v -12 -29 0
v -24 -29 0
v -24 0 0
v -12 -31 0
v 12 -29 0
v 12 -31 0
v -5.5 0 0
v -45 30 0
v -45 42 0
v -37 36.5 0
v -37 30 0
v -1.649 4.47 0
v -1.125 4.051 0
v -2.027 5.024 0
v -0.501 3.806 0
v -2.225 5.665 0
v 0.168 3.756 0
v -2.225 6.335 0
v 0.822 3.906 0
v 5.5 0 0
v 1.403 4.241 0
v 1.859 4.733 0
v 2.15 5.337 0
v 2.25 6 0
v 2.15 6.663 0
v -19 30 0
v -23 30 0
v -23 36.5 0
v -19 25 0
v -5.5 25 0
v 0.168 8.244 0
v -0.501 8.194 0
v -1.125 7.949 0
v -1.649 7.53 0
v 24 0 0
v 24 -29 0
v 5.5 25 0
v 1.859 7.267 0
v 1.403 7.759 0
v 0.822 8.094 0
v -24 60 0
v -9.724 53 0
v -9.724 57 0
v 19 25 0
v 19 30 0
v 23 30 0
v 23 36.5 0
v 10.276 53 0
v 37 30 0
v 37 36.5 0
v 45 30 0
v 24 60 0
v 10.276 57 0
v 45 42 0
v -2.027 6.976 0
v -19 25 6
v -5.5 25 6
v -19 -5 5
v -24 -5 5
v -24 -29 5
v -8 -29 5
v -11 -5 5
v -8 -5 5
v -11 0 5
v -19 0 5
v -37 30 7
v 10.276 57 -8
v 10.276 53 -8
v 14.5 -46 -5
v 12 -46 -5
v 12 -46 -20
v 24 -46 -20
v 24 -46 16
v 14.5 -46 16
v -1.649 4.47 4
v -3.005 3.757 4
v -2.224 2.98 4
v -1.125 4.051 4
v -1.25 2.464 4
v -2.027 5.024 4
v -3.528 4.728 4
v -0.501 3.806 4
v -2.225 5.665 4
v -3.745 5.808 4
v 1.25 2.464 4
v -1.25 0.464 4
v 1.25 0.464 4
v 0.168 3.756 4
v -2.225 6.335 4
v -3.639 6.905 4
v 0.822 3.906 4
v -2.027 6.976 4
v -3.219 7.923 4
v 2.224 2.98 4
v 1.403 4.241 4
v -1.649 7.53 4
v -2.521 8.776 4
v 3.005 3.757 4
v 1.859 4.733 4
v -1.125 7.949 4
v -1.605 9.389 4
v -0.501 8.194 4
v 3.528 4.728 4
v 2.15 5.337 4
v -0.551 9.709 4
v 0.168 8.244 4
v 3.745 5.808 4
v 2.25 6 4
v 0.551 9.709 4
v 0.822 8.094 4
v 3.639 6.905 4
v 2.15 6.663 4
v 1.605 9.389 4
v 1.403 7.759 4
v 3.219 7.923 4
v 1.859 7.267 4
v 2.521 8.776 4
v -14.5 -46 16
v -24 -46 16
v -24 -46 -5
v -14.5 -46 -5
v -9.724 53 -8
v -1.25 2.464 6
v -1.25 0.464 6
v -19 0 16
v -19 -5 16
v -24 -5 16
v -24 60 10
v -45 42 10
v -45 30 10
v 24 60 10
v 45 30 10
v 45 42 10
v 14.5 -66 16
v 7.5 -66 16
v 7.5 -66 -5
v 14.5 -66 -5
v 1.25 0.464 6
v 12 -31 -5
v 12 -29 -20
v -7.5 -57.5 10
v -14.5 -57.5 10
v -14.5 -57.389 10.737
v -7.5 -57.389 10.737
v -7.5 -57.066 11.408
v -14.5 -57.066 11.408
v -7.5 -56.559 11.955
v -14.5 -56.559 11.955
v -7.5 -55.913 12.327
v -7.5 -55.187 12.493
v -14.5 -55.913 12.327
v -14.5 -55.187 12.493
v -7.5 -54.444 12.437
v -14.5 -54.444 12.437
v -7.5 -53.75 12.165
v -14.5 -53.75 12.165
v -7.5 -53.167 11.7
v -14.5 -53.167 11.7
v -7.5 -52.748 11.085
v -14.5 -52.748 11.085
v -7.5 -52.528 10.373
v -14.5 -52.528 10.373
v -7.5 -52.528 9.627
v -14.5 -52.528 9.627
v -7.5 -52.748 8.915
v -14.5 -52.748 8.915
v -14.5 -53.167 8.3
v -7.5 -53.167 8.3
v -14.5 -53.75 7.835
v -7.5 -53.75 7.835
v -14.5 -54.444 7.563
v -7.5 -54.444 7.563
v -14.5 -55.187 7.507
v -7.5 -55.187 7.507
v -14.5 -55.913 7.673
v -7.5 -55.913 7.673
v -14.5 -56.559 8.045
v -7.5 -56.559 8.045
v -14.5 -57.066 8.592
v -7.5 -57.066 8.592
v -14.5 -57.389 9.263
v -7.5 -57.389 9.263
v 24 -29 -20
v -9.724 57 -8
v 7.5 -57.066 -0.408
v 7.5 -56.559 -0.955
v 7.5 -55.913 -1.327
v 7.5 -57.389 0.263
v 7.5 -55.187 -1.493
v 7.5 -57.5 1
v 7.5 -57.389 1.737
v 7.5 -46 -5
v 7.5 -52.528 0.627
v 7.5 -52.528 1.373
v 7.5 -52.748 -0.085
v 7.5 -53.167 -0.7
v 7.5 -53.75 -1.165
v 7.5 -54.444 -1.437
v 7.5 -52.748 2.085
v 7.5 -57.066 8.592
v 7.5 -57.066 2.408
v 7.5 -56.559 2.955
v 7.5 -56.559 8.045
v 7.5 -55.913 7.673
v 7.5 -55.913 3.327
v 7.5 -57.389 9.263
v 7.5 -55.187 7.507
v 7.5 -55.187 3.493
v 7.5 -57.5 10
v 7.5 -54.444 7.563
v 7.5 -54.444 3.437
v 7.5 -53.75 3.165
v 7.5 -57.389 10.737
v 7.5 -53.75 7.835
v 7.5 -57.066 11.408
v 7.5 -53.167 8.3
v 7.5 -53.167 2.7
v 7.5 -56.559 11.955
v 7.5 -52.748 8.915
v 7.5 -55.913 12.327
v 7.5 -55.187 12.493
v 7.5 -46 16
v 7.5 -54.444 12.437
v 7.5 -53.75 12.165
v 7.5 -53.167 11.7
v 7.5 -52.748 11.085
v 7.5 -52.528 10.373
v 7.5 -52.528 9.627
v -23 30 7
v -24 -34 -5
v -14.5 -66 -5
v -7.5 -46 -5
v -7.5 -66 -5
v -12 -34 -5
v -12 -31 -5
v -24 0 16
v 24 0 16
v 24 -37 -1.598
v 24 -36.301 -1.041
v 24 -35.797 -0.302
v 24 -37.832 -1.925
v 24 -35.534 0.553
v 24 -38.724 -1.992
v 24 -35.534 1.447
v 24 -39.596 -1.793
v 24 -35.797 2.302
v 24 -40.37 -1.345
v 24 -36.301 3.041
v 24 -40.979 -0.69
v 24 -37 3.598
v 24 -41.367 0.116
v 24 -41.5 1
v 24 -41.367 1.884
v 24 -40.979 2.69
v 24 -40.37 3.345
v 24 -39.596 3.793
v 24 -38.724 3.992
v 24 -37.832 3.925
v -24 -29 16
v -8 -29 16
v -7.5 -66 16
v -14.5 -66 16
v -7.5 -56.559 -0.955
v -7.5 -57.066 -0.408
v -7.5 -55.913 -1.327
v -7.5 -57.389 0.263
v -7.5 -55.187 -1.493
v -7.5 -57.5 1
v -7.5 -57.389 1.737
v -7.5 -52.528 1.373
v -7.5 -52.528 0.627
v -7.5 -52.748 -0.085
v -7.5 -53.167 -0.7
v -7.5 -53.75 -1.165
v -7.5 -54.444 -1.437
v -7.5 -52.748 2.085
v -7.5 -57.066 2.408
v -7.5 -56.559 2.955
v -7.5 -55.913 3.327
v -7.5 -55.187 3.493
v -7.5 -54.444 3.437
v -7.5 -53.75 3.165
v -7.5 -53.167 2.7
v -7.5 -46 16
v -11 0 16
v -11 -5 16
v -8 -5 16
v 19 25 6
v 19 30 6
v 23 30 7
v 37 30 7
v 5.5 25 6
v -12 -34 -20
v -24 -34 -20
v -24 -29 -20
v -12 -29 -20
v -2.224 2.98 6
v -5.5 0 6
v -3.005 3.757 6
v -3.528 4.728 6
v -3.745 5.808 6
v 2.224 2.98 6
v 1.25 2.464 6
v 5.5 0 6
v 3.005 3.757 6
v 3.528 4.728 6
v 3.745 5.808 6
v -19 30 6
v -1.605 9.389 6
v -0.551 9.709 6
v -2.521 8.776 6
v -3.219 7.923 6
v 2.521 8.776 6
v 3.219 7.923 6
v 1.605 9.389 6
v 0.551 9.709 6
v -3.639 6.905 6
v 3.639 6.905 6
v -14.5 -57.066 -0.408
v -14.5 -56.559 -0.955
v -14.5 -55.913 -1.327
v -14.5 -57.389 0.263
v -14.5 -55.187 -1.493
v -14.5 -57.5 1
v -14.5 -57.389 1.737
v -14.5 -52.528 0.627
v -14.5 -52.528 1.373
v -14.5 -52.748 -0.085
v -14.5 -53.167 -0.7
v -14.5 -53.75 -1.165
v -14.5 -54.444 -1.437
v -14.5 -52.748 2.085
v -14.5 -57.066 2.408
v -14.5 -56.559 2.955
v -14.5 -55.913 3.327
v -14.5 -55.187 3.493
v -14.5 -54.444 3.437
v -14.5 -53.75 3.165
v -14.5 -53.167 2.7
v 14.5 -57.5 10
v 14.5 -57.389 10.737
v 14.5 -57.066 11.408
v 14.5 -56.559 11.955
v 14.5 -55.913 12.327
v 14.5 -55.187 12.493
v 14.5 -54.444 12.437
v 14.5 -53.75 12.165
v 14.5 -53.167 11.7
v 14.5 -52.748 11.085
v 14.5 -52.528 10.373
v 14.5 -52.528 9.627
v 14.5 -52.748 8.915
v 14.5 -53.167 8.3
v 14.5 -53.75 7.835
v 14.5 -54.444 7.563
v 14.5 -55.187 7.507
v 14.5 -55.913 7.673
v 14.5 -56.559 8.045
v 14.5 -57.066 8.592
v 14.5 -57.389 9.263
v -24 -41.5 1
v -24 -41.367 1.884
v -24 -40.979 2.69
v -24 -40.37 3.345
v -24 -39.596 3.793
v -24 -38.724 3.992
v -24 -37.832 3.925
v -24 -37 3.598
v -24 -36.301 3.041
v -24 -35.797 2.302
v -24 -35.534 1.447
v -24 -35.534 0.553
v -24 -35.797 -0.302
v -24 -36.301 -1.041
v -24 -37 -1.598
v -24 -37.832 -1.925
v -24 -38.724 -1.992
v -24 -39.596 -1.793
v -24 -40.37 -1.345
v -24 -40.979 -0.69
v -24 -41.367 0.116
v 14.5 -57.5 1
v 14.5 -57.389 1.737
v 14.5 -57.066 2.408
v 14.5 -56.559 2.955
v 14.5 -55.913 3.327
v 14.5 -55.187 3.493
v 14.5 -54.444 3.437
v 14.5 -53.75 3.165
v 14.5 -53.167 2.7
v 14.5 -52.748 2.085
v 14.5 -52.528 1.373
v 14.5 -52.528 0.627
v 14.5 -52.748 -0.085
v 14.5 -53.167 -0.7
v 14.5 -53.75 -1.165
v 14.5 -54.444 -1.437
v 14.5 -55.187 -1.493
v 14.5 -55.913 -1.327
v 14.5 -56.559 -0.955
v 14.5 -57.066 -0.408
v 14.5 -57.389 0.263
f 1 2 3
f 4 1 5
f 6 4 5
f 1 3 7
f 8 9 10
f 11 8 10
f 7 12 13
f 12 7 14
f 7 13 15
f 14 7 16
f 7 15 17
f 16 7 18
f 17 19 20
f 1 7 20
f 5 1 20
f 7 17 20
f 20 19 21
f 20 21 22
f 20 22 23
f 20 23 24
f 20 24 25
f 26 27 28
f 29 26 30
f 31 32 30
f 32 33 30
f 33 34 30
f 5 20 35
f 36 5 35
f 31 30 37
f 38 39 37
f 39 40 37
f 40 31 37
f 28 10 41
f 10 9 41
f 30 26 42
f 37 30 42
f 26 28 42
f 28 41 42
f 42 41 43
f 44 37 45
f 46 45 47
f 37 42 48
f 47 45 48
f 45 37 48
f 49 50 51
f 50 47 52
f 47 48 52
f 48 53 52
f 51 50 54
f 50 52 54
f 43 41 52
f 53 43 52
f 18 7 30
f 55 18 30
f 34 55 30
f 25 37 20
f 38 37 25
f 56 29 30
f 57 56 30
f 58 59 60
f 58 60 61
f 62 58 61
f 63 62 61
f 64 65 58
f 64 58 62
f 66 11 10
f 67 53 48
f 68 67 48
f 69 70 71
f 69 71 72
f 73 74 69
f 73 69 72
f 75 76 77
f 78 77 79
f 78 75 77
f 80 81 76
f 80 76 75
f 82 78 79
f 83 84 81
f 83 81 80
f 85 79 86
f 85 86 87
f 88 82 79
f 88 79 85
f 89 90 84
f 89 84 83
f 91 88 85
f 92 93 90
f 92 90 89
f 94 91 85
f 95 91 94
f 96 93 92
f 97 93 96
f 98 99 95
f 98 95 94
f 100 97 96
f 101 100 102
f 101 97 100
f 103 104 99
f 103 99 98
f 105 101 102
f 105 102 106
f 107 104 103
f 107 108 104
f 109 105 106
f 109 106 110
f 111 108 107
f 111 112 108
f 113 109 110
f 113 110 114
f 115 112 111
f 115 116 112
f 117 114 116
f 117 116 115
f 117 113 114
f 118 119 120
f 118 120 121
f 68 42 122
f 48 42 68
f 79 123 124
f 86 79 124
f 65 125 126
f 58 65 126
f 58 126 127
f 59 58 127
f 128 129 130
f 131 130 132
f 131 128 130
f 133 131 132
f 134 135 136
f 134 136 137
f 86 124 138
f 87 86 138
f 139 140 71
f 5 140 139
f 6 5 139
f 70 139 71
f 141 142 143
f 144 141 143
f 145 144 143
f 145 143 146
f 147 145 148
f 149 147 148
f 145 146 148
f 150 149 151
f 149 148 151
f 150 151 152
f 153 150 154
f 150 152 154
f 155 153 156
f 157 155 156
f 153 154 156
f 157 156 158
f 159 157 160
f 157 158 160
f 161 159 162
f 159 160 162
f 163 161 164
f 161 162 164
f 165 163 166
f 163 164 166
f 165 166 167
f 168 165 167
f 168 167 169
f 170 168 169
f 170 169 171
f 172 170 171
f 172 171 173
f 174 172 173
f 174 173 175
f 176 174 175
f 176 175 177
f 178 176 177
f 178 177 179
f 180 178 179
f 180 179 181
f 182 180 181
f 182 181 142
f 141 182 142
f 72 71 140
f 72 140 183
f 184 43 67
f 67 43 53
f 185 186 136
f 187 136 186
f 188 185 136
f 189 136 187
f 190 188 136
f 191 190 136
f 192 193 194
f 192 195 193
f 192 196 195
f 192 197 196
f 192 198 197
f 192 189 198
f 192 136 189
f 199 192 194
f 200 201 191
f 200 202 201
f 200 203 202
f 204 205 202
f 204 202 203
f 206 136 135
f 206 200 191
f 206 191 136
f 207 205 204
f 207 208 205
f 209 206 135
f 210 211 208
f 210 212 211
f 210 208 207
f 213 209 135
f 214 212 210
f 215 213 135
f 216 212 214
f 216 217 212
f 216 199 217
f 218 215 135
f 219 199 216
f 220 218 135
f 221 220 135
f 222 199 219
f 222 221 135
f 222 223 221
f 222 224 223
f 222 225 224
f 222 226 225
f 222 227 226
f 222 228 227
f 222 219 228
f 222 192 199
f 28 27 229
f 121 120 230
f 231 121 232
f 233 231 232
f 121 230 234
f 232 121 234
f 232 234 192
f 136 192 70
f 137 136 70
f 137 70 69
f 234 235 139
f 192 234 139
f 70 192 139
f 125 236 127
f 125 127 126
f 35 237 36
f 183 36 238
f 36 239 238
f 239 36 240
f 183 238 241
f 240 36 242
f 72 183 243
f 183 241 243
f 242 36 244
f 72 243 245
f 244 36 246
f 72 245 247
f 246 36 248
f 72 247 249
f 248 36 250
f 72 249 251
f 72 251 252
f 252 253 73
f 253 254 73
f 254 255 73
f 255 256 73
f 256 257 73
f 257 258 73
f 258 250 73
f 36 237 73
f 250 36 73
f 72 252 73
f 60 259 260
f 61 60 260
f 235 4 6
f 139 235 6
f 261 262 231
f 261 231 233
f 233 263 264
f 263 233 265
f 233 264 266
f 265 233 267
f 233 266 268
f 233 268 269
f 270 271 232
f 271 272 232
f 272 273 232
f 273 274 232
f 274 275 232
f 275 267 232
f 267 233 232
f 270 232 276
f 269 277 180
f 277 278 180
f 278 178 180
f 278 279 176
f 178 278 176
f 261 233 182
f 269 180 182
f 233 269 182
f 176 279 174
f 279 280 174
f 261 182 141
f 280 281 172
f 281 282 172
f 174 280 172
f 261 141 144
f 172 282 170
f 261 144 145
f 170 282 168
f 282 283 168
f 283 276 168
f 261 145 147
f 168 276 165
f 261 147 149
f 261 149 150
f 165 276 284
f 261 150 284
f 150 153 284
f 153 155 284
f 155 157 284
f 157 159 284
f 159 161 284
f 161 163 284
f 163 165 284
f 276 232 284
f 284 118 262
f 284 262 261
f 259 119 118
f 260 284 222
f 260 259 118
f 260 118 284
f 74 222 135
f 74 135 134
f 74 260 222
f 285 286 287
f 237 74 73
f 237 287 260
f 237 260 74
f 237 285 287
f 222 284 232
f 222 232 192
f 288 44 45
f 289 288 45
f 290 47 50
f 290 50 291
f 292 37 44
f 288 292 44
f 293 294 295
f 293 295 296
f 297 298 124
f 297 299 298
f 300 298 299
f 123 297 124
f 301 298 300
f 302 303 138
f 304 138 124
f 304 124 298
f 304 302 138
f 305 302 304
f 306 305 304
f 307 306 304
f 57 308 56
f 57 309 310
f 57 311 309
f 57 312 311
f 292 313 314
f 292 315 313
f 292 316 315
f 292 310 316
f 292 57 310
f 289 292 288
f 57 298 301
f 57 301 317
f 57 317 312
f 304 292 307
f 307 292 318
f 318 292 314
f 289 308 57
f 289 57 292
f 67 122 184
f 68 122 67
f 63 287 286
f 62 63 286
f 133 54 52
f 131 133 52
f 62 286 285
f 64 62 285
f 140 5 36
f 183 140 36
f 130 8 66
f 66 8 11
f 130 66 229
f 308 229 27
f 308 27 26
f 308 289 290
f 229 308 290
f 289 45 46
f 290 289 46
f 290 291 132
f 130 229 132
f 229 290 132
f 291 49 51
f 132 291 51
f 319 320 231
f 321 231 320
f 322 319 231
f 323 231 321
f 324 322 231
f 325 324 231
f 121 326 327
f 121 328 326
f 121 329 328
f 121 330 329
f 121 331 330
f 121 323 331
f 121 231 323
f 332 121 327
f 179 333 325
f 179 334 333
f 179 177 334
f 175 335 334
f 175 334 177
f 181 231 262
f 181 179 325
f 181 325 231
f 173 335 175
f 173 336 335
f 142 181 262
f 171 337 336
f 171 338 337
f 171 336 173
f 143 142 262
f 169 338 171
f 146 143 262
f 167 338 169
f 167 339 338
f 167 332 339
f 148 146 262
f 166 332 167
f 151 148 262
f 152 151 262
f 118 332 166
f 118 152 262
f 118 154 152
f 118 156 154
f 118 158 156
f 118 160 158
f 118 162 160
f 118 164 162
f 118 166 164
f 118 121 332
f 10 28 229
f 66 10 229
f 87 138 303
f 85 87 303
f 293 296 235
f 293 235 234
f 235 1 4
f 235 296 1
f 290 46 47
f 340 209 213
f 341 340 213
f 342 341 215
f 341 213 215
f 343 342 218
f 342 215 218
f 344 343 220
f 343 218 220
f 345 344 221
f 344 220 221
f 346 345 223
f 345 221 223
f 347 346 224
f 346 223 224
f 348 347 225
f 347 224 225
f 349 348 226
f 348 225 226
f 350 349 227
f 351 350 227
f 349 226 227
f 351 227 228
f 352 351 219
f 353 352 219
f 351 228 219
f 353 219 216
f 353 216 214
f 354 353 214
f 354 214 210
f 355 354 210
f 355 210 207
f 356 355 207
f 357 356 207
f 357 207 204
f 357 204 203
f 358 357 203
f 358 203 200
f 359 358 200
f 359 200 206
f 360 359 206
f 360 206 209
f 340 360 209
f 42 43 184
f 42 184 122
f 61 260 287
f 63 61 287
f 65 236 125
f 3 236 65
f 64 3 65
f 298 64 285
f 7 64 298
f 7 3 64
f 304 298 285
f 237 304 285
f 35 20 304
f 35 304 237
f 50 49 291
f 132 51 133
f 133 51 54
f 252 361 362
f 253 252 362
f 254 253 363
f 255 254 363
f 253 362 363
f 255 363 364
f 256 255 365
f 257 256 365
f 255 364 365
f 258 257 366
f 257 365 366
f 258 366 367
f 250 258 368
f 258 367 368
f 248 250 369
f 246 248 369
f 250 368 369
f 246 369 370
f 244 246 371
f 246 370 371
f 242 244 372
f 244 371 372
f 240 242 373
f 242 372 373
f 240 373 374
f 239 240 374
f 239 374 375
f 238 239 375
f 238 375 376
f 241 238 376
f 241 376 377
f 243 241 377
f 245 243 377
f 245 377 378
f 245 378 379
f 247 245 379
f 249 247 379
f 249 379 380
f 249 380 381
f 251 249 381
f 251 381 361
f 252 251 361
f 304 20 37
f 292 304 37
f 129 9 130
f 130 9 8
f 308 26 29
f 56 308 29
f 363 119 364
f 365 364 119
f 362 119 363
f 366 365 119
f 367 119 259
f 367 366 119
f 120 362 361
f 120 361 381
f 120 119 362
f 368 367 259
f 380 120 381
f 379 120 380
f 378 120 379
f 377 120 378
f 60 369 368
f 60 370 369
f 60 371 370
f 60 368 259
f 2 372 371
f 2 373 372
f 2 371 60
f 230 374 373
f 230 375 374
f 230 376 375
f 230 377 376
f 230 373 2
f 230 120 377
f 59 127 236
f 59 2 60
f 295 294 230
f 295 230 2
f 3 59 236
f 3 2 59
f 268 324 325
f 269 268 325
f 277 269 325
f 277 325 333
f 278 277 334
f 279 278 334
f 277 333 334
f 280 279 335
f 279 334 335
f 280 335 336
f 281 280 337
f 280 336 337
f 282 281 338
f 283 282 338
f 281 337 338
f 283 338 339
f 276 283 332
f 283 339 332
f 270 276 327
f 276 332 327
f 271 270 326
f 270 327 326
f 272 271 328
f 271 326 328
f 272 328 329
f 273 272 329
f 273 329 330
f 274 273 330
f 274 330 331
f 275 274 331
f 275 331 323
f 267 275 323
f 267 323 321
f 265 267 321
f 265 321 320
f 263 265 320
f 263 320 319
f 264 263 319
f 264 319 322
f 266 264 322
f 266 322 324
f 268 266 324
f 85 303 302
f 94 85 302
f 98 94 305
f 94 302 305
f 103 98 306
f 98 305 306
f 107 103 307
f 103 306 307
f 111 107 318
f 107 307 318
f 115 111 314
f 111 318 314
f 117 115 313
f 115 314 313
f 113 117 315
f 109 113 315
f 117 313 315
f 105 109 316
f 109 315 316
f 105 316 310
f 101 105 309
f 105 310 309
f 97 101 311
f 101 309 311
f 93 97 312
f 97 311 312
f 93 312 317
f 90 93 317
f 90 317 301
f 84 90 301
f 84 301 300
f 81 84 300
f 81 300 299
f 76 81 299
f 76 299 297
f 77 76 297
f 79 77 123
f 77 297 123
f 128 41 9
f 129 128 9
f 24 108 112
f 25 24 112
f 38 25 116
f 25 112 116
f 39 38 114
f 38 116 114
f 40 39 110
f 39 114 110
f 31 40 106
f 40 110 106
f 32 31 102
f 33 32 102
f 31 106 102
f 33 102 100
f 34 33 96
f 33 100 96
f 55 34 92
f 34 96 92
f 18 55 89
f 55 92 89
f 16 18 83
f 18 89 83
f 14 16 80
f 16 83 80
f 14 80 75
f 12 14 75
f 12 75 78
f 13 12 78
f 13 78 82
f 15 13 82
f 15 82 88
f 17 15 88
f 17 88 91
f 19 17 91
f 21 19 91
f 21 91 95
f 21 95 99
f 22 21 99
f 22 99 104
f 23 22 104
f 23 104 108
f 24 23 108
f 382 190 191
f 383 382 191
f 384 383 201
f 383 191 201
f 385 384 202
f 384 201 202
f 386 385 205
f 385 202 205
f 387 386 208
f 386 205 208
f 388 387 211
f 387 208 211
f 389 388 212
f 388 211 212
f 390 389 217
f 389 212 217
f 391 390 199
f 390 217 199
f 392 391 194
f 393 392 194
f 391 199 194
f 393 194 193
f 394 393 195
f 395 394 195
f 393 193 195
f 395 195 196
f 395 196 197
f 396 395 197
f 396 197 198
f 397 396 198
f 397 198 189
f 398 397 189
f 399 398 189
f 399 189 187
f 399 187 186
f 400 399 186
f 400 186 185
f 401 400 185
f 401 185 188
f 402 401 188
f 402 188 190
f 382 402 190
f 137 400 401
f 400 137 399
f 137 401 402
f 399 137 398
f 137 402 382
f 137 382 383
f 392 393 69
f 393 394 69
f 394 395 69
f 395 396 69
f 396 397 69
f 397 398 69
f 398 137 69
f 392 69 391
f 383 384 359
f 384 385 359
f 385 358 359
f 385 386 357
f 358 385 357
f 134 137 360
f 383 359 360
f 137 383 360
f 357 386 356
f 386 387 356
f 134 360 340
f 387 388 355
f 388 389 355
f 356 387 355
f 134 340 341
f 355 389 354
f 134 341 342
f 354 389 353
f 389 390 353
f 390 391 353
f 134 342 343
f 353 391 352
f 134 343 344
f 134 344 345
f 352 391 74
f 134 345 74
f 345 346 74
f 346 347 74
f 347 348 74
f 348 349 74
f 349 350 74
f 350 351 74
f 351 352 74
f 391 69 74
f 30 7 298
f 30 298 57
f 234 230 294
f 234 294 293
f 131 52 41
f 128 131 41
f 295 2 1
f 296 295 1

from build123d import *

# Parameters (mm, degrees)
F0_W      = 48
F0_H      = 46
F1_DEPTH  = 16
F2_W      = 11
F2_H      = 25
F3_DEPTH  = 6
F5_DEPTH  = 10
F6_W      = 12
F6_H      = 5
F6_H_2    = 17
F7_DEPTH  = 20
F8_W      = 48
F8_H      = 15
F9_DEPTH  = 5
F10_W     = 7
F10_H     = 21
F11_DEPTH = 20
F13_DEPTH = 11
F14_R     = 2.5
F15_DEPTH = 59.501
F16_R     = 3
F17_DEPTH = 69.001
F18_R     = 2.25
F19_DEPTH = 26.001
F21_DEPTH = 2
F24_DEPTH = 14
F27_DEPTH = 14
F28_W     = 20
F28_H     = 4
F29_DEPTH = 8


with BuildPart() as f1:
    # F0 (on Top) → F1 (new body)
    with BuildSketch(Plane.XY):
        with Locations((0, -23)):
            Rectangle(F0_W, F0_H)
    extrude(amount=F1_DEPTH)

    # F2 (on Top) → F3 (join)
    with BuildSketch(Plane.XY):
        with Locations((0, 12.5)):
            Rectangle(F2_W, F2_H)
        Polygon((-19, 25), (-5.5, 25), (5.5, 25), (19, 25), (19, 30), (-19, 30), align=None)
    extrude(amount=F3_DEPTH)

    # F4 (on Top) → F5 (join)
    with BuildSketch(Plane.XY):
        Polygon((-45, 30), (0, 30), (45, 30), (45, 42), (24, 60), (-24, 60), (-45, 42), align=None)
    extrude(amount=F5_DEPTH)

    # F6 (on face) → F7 (join)
    with BuildSketch(Plane(origin=(0, 0, 0), x_dir=(1, 0, 0), z_dir=(0, 0, -1))):
        with Locations((-18, 31.5)):
            Rectangle(F6_W, F6_H)
        with Locations((18, 37.5)):
            Rectangle(F6_W, F6_H_2)
    extrude(amount=F7_DEPTH)

    # F8 (on face) → F9 (join)
    with BuildSketch(Plane(origin=(0, 0, 0), x_dir=(1, 0, 0), z_dir=(0, 0, -1))):
        with Locations((0, 38.5)):
            Rectangle(F8_W, F8_H)
    extrude(amount=F9_DEPTH)

    # F10 (on face) → F11 (join)
    with BuildSketch(Plane.XZ.offset(46)):
        with Locations((-11, 5.5)):
            Rectangle(F10_W, F10_H)
        with Locations((11, 5.5)):
            Rectangle(F10_W, F10_H)
    extrude(amount=F11_DEPTH)

    # F12 (on face) → F13 (cut)
    with BuildSketch(Plane.XY.offset(16)):
        Polygon((-11, 0), (-19, 0), (-19, -5), (-24, -5), (-24, -29), (-8, -29), (-8, -5), (-11, -5), align=None)
    extrude(amount=-F13_DEPTH, mode=Mode.SUBTRACT)

    # F14 (on face) → F15 (cut, through all)
    with BuildSketch(Plane(origin=(-14.5, 0, 0), x_dir=(0, -1, 0), z_dir=(-1, 0, 0))):
        with Locations((55, 10)):
            Circle(F14_R)
        with Locations((55, 1)):
            Circle(F14_R)
    extrude(amount=-F15_DEPTH, mode=Mode.SUBTRACT)

    # F16 (on face) → F17 (cut, through all)
    with BuildSketch(Plane(origin=(-24, 0, 0), x_dir=(0, -1, 0), z_dir=(-1, 0, 0))):
        with Locations((38.5, 1)):
            Circle(F16_R)
    extrude(amount=-F17_DEPTH, mode=Mode.SUBTRACT)

    # F18 (on face) → F19 (cut, through all)
    with BuildSketch(Plane.XY.offset(6)):
        with Locations((0, 6)):
            Circle(F18_R)
    extrude(amount=-F19_DEPTH, mode=Mode.SUBTRACT)

    # F20 (on face) → F21 (cut)
    with BuildSketch(Plane.XY.offset(6)):
        with BuildLine():
            Line((1.25, 0.464466), (1.25, 2.464466))
            ThreePointArc((1.25, 2.464466), (0, 9.75), (-1.25, 2.464466))
            Line((-1.25, 2.464466), (-1.25, 0.464466))
            Line((-1.25, 0.464466), (1.25, 0.464466))
        make_face()
    extrude(amount=-F21_DEPTH, mode=Mode.SUBTRACT)

    # F23 (on offset) → F24 (cut)
    with BuildSketch(Plane.YZ.offset(23)):
        Polygon((30, 0), (36.5, 0), (30, 7), align=None)
    extrude(amount=F24_DEPTH, mode=Mode.SUBTRACT)

    # F26 (on offset) → F27 (cut)
    with BuildSketch(Plane.YZ.offset(-23)):
        Polygon((30, 0), (36.5, 0), (30, 7), align=None)
    extrude(amount=-F27_DEPTH, mode=Mode.SUBTRACT)

    # F28 (on face) → F29 (join)
    with BuildSketch(Plane(origin=(0, 0, 0), x_dir=(1, 0, 0), z_dir=(0, 0, -1))):
        with Locations((0.275901, -55)):
            Rectangle(F28_W, F28_H)
    extrude(amount=F29_DEPTH)


solid = f1.part
